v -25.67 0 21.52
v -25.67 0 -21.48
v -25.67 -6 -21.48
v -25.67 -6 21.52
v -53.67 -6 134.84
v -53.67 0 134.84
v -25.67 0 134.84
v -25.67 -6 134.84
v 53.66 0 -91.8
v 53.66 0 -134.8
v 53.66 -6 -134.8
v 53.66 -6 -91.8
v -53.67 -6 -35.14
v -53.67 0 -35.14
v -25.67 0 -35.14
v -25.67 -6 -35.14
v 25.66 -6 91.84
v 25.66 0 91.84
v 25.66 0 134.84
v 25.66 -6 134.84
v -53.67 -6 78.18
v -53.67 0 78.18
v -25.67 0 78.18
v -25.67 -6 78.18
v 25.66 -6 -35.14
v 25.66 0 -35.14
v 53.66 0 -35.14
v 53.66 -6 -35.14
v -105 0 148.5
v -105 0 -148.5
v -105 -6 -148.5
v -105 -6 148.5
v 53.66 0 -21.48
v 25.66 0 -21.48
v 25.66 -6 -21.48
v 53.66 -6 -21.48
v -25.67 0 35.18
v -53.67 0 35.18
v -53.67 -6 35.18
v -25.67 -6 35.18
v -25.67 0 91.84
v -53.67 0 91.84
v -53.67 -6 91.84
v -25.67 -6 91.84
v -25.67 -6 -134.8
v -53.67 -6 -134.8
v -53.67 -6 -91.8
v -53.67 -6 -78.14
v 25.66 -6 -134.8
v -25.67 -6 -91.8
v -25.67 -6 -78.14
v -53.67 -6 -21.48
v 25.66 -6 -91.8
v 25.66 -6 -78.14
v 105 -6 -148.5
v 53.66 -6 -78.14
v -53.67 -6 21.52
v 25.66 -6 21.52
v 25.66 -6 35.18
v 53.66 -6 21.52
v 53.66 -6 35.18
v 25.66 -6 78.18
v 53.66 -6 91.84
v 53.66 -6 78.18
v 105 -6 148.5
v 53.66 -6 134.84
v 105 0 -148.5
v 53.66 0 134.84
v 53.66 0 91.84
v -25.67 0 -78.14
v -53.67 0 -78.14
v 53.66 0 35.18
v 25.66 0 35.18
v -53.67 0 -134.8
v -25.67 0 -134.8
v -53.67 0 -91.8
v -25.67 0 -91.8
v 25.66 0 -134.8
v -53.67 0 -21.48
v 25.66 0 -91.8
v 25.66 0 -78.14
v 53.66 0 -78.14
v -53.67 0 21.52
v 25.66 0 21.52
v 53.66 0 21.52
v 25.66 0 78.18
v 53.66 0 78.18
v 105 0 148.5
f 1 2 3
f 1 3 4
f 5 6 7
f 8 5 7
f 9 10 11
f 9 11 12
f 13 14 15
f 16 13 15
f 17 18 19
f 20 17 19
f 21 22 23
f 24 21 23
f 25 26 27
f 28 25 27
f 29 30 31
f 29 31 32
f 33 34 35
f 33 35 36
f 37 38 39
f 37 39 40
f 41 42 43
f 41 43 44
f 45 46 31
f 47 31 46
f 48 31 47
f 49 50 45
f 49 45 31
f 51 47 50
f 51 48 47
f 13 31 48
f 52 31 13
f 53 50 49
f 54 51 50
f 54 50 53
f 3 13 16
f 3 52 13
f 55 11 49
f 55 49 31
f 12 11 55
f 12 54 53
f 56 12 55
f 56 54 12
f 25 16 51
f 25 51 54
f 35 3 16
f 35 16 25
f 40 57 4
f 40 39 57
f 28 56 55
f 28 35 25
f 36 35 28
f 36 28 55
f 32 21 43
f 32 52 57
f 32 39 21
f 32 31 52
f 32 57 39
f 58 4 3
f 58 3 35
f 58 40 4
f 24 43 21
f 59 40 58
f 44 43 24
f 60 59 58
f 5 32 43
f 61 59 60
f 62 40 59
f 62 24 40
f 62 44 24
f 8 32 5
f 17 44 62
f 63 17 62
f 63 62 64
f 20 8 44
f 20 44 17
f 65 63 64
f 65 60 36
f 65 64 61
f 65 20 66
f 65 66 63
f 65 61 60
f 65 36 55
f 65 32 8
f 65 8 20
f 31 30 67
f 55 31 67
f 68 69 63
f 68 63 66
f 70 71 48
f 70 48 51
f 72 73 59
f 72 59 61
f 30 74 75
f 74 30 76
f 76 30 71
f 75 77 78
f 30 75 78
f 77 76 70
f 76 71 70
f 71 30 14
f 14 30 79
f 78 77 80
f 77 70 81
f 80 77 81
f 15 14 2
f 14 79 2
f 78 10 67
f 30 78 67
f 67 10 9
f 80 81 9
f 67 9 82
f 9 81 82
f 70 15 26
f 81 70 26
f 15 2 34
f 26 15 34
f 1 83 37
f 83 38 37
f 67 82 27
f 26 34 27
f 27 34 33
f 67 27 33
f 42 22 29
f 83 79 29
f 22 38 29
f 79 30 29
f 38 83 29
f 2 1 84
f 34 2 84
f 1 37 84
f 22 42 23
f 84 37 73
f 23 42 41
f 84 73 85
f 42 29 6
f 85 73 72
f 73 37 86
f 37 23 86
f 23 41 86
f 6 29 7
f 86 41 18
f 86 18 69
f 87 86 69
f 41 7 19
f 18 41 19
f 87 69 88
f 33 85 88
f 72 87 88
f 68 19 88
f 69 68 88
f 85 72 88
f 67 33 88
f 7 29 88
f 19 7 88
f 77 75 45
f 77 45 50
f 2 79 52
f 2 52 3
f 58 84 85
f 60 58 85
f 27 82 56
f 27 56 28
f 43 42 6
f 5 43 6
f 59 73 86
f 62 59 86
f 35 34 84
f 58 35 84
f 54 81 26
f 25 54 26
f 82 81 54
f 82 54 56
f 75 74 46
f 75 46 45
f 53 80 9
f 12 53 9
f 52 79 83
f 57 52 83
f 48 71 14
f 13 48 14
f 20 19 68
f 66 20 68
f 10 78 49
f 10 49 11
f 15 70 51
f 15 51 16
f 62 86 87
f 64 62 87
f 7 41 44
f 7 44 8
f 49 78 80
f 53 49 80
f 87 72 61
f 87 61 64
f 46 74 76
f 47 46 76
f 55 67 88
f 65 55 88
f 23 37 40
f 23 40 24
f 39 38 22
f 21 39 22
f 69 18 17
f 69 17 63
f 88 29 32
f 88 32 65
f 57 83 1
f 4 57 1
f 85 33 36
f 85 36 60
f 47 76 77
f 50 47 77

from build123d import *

# Parameters (mm, degrees)
F0_W     = 210
F0_H     = 297
F0_W_2   = 28
F0_H_2   = 43
F1_DEPTH = 6


with BuildPart() as f1:
    # F0 (on Front) → F1 (new body)
    with BuildSketch(Plane.XZ):
        Rectangle(F0_W, F0_H)
        with Locations((-39.67, -113.3)):
            Rectangle(F0_W_2, F0_H_2, mode=Mode.SUBTRACT)
        with Locations((-39.67, -56.64)):
            Rectangle(F0_W_2, F0_H_2, mode=Mode.SUBTRACT)
        with Locations((39.66, -113.3)):
            Rectangle(F0_W_2, F0_H_2, mode=Mode.SUBTRACT)
        with Locations((39.66, -56.64)):
            Rectangle(F0_W_2, F0_H_2, mode=Mode.SUBTRACT)
        with Locations((-39.67, 0.02)):
            Rectangle(F0_W_2, F0_H_2, mode=Mode.SUBTRACT)
        with Locations((-39.67, 56.68)):
            Rectangle(F0_W_2, F0_H_2, mode=Mode.SUBTRACT)
        with Locations((-39.67, 113.34)):
            Rectangle(F0_W_2, F0_H_2, mode=Mode.SUBTRACT)
        with Locations((39.66, 0.02)):
            Rectangle(F0_W_2, F0_H_2, mode=Mode.SUBTRACT)
        with Locations((39.66, 56.68)):
            Rectangle(F0_W_2, F0_H_2, mode=Mode.SUBTRACT)
        with Locations((39.66, 113.34)):
            Rectangle(F0_W_2, F0_H_2, mode=Mode.SUBTRACT)
    extrude(amount=F1_DEPTH)


solid = f1.part
